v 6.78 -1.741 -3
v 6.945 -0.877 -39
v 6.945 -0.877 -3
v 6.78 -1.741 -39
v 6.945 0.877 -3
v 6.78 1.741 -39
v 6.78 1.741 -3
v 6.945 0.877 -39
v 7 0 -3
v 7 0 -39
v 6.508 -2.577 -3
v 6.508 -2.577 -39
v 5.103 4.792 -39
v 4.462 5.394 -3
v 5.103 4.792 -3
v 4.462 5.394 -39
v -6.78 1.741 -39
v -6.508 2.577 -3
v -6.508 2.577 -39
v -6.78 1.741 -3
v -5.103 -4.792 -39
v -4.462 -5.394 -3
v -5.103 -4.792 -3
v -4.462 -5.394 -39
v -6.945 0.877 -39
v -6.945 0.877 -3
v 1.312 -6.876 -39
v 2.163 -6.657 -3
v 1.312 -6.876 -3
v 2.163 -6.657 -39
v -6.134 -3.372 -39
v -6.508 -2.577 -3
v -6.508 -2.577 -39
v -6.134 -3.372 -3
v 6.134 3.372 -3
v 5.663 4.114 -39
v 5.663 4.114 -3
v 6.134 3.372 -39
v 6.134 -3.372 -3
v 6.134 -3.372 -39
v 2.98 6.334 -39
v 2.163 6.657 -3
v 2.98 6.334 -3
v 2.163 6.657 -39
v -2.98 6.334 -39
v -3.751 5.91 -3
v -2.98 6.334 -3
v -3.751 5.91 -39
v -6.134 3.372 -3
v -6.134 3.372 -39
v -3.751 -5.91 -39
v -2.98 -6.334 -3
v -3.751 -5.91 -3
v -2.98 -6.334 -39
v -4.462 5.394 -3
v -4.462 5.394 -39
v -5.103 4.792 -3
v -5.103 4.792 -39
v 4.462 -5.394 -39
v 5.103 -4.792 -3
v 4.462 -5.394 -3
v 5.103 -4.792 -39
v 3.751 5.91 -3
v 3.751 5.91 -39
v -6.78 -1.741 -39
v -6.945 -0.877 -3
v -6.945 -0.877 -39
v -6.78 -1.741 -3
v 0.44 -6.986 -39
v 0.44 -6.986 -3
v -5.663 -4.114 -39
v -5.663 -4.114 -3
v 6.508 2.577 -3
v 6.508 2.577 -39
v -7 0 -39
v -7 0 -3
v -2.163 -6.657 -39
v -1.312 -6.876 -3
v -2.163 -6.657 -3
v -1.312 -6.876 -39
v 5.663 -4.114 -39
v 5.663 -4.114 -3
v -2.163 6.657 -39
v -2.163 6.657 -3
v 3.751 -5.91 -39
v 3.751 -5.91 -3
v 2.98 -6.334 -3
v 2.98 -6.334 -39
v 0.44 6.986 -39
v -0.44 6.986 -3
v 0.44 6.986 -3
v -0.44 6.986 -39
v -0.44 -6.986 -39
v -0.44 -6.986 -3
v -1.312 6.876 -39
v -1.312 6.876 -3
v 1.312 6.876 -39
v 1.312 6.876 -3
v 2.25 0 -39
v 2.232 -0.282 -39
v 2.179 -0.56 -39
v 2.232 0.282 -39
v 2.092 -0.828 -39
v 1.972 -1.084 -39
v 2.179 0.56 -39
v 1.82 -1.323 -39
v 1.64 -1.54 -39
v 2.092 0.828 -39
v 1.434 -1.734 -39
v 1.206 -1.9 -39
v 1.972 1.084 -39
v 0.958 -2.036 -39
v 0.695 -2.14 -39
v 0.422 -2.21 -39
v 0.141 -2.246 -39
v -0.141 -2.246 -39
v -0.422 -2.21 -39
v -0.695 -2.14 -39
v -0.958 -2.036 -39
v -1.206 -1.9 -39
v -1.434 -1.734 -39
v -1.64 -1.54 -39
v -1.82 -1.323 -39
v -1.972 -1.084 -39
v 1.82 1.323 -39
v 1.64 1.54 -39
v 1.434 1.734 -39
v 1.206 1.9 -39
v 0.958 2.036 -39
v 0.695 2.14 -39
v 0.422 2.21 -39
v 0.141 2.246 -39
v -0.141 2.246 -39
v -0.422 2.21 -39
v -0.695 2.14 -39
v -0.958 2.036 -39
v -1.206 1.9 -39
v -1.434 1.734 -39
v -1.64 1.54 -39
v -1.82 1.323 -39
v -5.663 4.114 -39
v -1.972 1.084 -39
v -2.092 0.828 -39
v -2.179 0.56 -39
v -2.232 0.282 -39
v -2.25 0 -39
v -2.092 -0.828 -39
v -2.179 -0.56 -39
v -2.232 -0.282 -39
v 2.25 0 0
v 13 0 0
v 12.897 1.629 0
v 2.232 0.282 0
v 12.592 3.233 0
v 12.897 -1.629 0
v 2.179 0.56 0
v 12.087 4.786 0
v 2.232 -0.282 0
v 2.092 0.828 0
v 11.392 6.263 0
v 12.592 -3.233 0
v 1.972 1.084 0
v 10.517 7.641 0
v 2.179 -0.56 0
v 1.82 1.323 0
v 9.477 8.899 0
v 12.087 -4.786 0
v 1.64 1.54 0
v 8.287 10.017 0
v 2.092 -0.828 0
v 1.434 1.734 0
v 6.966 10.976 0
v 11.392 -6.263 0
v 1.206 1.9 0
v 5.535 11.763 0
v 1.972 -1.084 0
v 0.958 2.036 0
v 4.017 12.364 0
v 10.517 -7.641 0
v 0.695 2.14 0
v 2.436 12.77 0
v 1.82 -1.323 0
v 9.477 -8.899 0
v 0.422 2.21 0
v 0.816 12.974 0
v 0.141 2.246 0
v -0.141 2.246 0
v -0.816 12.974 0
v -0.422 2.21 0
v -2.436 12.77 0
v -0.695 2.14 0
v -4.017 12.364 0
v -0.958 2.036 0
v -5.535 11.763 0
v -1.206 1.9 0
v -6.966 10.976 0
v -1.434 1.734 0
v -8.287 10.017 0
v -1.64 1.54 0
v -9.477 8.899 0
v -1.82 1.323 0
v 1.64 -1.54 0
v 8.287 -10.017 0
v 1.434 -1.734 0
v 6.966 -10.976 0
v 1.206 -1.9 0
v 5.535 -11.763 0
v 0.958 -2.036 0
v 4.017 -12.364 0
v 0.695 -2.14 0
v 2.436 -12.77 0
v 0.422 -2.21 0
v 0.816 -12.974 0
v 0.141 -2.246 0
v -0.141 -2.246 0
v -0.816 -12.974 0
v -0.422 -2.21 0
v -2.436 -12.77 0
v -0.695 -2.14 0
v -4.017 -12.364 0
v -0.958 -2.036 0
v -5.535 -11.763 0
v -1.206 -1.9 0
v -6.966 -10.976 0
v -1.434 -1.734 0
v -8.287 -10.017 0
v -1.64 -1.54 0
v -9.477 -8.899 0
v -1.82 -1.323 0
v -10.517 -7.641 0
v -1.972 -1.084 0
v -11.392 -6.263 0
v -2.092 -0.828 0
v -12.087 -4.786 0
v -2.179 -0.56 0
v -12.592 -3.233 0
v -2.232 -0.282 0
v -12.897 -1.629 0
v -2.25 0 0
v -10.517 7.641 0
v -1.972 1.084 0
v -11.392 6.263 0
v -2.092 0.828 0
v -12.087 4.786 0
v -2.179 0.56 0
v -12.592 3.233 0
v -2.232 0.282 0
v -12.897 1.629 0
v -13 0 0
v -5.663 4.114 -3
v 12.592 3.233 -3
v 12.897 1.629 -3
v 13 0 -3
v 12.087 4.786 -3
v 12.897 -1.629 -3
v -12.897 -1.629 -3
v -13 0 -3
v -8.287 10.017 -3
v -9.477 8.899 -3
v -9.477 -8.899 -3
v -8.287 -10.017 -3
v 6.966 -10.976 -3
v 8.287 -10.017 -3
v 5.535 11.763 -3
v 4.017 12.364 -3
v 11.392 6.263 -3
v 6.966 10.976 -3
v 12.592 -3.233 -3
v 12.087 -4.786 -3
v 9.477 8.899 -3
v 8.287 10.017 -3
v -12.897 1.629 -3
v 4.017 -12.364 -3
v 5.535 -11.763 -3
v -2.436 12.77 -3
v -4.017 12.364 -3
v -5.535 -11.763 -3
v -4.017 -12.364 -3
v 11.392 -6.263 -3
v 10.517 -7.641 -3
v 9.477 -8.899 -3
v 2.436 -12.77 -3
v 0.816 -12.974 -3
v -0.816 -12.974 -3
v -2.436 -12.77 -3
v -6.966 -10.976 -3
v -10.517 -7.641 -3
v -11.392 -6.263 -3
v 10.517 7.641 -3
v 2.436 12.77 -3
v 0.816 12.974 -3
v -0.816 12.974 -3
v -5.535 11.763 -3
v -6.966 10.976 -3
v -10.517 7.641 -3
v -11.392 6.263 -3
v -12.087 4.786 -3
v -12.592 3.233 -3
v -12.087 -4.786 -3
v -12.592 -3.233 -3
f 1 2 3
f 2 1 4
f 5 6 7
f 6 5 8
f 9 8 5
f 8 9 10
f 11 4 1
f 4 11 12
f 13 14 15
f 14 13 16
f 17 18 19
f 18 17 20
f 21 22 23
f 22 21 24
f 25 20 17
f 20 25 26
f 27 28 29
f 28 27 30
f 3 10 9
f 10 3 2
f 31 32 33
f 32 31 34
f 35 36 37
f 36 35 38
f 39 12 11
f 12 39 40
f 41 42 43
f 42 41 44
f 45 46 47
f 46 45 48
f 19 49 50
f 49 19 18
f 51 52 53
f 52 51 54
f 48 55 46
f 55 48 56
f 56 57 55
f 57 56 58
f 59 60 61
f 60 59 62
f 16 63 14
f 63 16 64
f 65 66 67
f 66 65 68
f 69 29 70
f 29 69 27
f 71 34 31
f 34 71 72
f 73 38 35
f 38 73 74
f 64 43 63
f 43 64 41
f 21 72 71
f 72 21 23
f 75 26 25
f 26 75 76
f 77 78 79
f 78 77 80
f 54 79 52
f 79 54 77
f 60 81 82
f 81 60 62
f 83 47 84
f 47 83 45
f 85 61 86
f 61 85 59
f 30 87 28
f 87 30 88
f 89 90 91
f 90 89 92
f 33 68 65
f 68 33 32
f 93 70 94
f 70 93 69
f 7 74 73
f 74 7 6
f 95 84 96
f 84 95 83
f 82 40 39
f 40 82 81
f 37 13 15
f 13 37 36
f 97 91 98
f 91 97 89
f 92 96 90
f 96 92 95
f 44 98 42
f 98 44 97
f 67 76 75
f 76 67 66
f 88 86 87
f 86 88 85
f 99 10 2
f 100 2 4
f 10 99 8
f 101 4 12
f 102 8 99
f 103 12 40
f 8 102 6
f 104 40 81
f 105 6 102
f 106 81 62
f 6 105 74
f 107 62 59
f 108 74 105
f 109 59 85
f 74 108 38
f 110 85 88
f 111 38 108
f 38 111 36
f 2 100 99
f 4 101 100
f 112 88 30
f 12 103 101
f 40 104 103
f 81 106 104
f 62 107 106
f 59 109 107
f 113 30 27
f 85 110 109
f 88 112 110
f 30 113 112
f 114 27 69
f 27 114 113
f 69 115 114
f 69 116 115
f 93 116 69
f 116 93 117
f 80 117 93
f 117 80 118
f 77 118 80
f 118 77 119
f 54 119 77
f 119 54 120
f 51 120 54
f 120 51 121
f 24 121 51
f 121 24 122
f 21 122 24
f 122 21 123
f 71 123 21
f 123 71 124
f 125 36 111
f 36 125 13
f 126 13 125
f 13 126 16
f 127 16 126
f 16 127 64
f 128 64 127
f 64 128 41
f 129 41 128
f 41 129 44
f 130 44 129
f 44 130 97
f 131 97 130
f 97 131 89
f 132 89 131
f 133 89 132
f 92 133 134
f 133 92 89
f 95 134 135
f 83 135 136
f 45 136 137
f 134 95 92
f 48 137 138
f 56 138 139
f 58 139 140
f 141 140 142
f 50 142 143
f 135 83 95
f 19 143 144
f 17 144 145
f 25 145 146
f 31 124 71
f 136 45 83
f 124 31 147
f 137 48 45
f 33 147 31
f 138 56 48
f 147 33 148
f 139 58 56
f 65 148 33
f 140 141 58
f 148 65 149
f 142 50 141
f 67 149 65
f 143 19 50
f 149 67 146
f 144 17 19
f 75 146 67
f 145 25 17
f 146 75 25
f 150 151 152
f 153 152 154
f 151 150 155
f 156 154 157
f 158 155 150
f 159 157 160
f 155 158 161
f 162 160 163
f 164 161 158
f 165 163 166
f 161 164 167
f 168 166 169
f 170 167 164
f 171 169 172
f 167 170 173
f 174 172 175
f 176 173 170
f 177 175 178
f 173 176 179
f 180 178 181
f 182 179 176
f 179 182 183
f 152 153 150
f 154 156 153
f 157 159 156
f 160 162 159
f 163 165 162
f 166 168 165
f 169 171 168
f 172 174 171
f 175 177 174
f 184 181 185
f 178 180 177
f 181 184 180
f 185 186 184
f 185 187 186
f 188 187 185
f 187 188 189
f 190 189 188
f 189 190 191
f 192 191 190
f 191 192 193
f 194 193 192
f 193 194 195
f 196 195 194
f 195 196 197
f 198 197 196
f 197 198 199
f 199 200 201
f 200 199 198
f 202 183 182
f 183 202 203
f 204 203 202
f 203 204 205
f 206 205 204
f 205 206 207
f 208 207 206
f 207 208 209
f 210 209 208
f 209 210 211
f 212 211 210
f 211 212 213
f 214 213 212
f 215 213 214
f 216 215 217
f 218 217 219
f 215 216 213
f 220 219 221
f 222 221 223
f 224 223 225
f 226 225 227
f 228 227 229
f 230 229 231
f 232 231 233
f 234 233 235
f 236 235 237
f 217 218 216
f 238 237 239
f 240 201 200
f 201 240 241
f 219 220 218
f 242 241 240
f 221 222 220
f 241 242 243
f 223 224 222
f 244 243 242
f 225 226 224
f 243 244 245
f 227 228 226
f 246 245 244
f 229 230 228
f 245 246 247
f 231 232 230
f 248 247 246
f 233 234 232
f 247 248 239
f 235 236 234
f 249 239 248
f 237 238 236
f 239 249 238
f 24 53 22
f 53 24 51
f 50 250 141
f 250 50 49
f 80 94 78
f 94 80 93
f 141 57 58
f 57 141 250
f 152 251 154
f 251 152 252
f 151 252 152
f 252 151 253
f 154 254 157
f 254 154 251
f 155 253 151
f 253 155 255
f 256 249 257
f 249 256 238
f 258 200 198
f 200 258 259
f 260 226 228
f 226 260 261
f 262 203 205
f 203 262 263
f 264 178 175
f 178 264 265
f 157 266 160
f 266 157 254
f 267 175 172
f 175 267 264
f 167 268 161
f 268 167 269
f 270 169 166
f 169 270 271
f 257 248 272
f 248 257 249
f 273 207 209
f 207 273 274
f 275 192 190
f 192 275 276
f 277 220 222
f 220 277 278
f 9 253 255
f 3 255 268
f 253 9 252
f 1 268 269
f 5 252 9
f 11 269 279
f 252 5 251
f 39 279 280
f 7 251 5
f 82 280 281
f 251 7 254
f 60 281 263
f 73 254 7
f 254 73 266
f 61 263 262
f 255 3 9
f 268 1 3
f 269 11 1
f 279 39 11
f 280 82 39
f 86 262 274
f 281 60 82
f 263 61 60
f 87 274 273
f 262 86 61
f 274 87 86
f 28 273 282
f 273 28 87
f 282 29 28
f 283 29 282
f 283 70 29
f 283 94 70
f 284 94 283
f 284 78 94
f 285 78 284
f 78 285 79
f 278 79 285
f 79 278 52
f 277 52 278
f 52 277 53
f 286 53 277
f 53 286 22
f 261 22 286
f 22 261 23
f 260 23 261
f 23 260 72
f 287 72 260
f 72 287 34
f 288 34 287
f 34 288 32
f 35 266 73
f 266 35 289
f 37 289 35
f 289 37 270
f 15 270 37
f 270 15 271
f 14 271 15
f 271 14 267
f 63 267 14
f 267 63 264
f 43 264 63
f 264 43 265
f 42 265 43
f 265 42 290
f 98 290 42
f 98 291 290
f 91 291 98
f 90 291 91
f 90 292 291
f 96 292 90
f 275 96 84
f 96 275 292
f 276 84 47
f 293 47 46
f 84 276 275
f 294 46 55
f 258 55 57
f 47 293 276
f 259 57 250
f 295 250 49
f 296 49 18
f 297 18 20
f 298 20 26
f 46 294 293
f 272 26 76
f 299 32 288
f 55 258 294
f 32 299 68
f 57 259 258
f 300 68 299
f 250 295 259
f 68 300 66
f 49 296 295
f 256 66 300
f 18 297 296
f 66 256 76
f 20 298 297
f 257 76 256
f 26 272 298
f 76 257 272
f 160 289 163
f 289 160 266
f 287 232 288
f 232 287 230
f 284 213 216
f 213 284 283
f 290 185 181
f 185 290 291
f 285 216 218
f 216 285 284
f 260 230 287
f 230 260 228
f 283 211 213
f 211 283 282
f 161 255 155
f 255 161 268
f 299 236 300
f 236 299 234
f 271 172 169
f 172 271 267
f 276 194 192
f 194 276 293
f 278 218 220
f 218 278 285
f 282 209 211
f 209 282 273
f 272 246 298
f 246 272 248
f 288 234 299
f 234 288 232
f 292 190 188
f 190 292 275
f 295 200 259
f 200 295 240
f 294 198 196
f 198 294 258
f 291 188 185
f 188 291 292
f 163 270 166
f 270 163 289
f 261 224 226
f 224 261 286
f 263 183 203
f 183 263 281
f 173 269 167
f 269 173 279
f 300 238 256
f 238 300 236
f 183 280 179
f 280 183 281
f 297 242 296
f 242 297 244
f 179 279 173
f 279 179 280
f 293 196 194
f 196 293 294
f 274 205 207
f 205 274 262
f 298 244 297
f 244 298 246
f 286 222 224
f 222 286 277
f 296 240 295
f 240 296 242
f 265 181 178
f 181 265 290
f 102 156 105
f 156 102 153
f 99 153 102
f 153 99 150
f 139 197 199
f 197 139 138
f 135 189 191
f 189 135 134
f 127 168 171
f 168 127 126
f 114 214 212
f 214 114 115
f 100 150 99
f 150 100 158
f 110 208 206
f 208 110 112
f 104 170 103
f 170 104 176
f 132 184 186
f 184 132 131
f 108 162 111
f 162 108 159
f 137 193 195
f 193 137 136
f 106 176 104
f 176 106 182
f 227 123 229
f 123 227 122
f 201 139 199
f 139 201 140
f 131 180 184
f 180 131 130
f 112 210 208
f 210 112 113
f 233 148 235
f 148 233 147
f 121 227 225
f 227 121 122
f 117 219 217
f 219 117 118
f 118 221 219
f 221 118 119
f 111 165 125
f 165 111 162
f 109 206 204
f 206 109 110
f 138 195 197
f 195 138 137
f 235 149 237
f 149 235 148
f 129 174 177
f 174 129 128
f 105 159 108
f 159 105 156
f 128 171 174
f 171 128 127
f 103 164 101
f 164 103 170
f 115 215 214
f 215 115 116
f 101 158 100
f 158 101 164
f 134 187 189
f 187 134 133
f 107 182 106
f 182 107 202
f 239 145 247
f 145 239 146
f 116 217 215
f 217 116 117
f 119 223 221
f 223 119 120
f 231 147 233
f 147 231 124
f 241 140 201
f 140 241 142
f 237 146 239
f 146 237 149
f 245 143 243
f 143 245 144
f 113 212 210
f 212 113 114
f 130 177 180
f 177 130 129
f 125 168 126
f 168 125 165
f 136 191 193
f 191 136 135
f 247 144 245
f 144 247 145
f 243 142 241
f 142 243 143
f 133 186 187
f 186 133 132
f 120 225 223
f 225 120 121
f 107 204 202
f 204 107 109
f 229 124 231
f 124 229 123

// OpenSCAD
$fn = 50;


difference() {
	union() {
		translate(v = [0, 0, -39.0000000000]) {
			cylinder(h = 39, r = 7.0000000000);
		}
		translate(v = [0, 0, -3.0000000000]) {
			cylinder(h = 3, r = 13.0000000000);
		}
	}
	union() {
		#translate(v = [0, 0, -39]) {
			cylinder(h = 39, r = 2.2500000000);
		}
	}
}
